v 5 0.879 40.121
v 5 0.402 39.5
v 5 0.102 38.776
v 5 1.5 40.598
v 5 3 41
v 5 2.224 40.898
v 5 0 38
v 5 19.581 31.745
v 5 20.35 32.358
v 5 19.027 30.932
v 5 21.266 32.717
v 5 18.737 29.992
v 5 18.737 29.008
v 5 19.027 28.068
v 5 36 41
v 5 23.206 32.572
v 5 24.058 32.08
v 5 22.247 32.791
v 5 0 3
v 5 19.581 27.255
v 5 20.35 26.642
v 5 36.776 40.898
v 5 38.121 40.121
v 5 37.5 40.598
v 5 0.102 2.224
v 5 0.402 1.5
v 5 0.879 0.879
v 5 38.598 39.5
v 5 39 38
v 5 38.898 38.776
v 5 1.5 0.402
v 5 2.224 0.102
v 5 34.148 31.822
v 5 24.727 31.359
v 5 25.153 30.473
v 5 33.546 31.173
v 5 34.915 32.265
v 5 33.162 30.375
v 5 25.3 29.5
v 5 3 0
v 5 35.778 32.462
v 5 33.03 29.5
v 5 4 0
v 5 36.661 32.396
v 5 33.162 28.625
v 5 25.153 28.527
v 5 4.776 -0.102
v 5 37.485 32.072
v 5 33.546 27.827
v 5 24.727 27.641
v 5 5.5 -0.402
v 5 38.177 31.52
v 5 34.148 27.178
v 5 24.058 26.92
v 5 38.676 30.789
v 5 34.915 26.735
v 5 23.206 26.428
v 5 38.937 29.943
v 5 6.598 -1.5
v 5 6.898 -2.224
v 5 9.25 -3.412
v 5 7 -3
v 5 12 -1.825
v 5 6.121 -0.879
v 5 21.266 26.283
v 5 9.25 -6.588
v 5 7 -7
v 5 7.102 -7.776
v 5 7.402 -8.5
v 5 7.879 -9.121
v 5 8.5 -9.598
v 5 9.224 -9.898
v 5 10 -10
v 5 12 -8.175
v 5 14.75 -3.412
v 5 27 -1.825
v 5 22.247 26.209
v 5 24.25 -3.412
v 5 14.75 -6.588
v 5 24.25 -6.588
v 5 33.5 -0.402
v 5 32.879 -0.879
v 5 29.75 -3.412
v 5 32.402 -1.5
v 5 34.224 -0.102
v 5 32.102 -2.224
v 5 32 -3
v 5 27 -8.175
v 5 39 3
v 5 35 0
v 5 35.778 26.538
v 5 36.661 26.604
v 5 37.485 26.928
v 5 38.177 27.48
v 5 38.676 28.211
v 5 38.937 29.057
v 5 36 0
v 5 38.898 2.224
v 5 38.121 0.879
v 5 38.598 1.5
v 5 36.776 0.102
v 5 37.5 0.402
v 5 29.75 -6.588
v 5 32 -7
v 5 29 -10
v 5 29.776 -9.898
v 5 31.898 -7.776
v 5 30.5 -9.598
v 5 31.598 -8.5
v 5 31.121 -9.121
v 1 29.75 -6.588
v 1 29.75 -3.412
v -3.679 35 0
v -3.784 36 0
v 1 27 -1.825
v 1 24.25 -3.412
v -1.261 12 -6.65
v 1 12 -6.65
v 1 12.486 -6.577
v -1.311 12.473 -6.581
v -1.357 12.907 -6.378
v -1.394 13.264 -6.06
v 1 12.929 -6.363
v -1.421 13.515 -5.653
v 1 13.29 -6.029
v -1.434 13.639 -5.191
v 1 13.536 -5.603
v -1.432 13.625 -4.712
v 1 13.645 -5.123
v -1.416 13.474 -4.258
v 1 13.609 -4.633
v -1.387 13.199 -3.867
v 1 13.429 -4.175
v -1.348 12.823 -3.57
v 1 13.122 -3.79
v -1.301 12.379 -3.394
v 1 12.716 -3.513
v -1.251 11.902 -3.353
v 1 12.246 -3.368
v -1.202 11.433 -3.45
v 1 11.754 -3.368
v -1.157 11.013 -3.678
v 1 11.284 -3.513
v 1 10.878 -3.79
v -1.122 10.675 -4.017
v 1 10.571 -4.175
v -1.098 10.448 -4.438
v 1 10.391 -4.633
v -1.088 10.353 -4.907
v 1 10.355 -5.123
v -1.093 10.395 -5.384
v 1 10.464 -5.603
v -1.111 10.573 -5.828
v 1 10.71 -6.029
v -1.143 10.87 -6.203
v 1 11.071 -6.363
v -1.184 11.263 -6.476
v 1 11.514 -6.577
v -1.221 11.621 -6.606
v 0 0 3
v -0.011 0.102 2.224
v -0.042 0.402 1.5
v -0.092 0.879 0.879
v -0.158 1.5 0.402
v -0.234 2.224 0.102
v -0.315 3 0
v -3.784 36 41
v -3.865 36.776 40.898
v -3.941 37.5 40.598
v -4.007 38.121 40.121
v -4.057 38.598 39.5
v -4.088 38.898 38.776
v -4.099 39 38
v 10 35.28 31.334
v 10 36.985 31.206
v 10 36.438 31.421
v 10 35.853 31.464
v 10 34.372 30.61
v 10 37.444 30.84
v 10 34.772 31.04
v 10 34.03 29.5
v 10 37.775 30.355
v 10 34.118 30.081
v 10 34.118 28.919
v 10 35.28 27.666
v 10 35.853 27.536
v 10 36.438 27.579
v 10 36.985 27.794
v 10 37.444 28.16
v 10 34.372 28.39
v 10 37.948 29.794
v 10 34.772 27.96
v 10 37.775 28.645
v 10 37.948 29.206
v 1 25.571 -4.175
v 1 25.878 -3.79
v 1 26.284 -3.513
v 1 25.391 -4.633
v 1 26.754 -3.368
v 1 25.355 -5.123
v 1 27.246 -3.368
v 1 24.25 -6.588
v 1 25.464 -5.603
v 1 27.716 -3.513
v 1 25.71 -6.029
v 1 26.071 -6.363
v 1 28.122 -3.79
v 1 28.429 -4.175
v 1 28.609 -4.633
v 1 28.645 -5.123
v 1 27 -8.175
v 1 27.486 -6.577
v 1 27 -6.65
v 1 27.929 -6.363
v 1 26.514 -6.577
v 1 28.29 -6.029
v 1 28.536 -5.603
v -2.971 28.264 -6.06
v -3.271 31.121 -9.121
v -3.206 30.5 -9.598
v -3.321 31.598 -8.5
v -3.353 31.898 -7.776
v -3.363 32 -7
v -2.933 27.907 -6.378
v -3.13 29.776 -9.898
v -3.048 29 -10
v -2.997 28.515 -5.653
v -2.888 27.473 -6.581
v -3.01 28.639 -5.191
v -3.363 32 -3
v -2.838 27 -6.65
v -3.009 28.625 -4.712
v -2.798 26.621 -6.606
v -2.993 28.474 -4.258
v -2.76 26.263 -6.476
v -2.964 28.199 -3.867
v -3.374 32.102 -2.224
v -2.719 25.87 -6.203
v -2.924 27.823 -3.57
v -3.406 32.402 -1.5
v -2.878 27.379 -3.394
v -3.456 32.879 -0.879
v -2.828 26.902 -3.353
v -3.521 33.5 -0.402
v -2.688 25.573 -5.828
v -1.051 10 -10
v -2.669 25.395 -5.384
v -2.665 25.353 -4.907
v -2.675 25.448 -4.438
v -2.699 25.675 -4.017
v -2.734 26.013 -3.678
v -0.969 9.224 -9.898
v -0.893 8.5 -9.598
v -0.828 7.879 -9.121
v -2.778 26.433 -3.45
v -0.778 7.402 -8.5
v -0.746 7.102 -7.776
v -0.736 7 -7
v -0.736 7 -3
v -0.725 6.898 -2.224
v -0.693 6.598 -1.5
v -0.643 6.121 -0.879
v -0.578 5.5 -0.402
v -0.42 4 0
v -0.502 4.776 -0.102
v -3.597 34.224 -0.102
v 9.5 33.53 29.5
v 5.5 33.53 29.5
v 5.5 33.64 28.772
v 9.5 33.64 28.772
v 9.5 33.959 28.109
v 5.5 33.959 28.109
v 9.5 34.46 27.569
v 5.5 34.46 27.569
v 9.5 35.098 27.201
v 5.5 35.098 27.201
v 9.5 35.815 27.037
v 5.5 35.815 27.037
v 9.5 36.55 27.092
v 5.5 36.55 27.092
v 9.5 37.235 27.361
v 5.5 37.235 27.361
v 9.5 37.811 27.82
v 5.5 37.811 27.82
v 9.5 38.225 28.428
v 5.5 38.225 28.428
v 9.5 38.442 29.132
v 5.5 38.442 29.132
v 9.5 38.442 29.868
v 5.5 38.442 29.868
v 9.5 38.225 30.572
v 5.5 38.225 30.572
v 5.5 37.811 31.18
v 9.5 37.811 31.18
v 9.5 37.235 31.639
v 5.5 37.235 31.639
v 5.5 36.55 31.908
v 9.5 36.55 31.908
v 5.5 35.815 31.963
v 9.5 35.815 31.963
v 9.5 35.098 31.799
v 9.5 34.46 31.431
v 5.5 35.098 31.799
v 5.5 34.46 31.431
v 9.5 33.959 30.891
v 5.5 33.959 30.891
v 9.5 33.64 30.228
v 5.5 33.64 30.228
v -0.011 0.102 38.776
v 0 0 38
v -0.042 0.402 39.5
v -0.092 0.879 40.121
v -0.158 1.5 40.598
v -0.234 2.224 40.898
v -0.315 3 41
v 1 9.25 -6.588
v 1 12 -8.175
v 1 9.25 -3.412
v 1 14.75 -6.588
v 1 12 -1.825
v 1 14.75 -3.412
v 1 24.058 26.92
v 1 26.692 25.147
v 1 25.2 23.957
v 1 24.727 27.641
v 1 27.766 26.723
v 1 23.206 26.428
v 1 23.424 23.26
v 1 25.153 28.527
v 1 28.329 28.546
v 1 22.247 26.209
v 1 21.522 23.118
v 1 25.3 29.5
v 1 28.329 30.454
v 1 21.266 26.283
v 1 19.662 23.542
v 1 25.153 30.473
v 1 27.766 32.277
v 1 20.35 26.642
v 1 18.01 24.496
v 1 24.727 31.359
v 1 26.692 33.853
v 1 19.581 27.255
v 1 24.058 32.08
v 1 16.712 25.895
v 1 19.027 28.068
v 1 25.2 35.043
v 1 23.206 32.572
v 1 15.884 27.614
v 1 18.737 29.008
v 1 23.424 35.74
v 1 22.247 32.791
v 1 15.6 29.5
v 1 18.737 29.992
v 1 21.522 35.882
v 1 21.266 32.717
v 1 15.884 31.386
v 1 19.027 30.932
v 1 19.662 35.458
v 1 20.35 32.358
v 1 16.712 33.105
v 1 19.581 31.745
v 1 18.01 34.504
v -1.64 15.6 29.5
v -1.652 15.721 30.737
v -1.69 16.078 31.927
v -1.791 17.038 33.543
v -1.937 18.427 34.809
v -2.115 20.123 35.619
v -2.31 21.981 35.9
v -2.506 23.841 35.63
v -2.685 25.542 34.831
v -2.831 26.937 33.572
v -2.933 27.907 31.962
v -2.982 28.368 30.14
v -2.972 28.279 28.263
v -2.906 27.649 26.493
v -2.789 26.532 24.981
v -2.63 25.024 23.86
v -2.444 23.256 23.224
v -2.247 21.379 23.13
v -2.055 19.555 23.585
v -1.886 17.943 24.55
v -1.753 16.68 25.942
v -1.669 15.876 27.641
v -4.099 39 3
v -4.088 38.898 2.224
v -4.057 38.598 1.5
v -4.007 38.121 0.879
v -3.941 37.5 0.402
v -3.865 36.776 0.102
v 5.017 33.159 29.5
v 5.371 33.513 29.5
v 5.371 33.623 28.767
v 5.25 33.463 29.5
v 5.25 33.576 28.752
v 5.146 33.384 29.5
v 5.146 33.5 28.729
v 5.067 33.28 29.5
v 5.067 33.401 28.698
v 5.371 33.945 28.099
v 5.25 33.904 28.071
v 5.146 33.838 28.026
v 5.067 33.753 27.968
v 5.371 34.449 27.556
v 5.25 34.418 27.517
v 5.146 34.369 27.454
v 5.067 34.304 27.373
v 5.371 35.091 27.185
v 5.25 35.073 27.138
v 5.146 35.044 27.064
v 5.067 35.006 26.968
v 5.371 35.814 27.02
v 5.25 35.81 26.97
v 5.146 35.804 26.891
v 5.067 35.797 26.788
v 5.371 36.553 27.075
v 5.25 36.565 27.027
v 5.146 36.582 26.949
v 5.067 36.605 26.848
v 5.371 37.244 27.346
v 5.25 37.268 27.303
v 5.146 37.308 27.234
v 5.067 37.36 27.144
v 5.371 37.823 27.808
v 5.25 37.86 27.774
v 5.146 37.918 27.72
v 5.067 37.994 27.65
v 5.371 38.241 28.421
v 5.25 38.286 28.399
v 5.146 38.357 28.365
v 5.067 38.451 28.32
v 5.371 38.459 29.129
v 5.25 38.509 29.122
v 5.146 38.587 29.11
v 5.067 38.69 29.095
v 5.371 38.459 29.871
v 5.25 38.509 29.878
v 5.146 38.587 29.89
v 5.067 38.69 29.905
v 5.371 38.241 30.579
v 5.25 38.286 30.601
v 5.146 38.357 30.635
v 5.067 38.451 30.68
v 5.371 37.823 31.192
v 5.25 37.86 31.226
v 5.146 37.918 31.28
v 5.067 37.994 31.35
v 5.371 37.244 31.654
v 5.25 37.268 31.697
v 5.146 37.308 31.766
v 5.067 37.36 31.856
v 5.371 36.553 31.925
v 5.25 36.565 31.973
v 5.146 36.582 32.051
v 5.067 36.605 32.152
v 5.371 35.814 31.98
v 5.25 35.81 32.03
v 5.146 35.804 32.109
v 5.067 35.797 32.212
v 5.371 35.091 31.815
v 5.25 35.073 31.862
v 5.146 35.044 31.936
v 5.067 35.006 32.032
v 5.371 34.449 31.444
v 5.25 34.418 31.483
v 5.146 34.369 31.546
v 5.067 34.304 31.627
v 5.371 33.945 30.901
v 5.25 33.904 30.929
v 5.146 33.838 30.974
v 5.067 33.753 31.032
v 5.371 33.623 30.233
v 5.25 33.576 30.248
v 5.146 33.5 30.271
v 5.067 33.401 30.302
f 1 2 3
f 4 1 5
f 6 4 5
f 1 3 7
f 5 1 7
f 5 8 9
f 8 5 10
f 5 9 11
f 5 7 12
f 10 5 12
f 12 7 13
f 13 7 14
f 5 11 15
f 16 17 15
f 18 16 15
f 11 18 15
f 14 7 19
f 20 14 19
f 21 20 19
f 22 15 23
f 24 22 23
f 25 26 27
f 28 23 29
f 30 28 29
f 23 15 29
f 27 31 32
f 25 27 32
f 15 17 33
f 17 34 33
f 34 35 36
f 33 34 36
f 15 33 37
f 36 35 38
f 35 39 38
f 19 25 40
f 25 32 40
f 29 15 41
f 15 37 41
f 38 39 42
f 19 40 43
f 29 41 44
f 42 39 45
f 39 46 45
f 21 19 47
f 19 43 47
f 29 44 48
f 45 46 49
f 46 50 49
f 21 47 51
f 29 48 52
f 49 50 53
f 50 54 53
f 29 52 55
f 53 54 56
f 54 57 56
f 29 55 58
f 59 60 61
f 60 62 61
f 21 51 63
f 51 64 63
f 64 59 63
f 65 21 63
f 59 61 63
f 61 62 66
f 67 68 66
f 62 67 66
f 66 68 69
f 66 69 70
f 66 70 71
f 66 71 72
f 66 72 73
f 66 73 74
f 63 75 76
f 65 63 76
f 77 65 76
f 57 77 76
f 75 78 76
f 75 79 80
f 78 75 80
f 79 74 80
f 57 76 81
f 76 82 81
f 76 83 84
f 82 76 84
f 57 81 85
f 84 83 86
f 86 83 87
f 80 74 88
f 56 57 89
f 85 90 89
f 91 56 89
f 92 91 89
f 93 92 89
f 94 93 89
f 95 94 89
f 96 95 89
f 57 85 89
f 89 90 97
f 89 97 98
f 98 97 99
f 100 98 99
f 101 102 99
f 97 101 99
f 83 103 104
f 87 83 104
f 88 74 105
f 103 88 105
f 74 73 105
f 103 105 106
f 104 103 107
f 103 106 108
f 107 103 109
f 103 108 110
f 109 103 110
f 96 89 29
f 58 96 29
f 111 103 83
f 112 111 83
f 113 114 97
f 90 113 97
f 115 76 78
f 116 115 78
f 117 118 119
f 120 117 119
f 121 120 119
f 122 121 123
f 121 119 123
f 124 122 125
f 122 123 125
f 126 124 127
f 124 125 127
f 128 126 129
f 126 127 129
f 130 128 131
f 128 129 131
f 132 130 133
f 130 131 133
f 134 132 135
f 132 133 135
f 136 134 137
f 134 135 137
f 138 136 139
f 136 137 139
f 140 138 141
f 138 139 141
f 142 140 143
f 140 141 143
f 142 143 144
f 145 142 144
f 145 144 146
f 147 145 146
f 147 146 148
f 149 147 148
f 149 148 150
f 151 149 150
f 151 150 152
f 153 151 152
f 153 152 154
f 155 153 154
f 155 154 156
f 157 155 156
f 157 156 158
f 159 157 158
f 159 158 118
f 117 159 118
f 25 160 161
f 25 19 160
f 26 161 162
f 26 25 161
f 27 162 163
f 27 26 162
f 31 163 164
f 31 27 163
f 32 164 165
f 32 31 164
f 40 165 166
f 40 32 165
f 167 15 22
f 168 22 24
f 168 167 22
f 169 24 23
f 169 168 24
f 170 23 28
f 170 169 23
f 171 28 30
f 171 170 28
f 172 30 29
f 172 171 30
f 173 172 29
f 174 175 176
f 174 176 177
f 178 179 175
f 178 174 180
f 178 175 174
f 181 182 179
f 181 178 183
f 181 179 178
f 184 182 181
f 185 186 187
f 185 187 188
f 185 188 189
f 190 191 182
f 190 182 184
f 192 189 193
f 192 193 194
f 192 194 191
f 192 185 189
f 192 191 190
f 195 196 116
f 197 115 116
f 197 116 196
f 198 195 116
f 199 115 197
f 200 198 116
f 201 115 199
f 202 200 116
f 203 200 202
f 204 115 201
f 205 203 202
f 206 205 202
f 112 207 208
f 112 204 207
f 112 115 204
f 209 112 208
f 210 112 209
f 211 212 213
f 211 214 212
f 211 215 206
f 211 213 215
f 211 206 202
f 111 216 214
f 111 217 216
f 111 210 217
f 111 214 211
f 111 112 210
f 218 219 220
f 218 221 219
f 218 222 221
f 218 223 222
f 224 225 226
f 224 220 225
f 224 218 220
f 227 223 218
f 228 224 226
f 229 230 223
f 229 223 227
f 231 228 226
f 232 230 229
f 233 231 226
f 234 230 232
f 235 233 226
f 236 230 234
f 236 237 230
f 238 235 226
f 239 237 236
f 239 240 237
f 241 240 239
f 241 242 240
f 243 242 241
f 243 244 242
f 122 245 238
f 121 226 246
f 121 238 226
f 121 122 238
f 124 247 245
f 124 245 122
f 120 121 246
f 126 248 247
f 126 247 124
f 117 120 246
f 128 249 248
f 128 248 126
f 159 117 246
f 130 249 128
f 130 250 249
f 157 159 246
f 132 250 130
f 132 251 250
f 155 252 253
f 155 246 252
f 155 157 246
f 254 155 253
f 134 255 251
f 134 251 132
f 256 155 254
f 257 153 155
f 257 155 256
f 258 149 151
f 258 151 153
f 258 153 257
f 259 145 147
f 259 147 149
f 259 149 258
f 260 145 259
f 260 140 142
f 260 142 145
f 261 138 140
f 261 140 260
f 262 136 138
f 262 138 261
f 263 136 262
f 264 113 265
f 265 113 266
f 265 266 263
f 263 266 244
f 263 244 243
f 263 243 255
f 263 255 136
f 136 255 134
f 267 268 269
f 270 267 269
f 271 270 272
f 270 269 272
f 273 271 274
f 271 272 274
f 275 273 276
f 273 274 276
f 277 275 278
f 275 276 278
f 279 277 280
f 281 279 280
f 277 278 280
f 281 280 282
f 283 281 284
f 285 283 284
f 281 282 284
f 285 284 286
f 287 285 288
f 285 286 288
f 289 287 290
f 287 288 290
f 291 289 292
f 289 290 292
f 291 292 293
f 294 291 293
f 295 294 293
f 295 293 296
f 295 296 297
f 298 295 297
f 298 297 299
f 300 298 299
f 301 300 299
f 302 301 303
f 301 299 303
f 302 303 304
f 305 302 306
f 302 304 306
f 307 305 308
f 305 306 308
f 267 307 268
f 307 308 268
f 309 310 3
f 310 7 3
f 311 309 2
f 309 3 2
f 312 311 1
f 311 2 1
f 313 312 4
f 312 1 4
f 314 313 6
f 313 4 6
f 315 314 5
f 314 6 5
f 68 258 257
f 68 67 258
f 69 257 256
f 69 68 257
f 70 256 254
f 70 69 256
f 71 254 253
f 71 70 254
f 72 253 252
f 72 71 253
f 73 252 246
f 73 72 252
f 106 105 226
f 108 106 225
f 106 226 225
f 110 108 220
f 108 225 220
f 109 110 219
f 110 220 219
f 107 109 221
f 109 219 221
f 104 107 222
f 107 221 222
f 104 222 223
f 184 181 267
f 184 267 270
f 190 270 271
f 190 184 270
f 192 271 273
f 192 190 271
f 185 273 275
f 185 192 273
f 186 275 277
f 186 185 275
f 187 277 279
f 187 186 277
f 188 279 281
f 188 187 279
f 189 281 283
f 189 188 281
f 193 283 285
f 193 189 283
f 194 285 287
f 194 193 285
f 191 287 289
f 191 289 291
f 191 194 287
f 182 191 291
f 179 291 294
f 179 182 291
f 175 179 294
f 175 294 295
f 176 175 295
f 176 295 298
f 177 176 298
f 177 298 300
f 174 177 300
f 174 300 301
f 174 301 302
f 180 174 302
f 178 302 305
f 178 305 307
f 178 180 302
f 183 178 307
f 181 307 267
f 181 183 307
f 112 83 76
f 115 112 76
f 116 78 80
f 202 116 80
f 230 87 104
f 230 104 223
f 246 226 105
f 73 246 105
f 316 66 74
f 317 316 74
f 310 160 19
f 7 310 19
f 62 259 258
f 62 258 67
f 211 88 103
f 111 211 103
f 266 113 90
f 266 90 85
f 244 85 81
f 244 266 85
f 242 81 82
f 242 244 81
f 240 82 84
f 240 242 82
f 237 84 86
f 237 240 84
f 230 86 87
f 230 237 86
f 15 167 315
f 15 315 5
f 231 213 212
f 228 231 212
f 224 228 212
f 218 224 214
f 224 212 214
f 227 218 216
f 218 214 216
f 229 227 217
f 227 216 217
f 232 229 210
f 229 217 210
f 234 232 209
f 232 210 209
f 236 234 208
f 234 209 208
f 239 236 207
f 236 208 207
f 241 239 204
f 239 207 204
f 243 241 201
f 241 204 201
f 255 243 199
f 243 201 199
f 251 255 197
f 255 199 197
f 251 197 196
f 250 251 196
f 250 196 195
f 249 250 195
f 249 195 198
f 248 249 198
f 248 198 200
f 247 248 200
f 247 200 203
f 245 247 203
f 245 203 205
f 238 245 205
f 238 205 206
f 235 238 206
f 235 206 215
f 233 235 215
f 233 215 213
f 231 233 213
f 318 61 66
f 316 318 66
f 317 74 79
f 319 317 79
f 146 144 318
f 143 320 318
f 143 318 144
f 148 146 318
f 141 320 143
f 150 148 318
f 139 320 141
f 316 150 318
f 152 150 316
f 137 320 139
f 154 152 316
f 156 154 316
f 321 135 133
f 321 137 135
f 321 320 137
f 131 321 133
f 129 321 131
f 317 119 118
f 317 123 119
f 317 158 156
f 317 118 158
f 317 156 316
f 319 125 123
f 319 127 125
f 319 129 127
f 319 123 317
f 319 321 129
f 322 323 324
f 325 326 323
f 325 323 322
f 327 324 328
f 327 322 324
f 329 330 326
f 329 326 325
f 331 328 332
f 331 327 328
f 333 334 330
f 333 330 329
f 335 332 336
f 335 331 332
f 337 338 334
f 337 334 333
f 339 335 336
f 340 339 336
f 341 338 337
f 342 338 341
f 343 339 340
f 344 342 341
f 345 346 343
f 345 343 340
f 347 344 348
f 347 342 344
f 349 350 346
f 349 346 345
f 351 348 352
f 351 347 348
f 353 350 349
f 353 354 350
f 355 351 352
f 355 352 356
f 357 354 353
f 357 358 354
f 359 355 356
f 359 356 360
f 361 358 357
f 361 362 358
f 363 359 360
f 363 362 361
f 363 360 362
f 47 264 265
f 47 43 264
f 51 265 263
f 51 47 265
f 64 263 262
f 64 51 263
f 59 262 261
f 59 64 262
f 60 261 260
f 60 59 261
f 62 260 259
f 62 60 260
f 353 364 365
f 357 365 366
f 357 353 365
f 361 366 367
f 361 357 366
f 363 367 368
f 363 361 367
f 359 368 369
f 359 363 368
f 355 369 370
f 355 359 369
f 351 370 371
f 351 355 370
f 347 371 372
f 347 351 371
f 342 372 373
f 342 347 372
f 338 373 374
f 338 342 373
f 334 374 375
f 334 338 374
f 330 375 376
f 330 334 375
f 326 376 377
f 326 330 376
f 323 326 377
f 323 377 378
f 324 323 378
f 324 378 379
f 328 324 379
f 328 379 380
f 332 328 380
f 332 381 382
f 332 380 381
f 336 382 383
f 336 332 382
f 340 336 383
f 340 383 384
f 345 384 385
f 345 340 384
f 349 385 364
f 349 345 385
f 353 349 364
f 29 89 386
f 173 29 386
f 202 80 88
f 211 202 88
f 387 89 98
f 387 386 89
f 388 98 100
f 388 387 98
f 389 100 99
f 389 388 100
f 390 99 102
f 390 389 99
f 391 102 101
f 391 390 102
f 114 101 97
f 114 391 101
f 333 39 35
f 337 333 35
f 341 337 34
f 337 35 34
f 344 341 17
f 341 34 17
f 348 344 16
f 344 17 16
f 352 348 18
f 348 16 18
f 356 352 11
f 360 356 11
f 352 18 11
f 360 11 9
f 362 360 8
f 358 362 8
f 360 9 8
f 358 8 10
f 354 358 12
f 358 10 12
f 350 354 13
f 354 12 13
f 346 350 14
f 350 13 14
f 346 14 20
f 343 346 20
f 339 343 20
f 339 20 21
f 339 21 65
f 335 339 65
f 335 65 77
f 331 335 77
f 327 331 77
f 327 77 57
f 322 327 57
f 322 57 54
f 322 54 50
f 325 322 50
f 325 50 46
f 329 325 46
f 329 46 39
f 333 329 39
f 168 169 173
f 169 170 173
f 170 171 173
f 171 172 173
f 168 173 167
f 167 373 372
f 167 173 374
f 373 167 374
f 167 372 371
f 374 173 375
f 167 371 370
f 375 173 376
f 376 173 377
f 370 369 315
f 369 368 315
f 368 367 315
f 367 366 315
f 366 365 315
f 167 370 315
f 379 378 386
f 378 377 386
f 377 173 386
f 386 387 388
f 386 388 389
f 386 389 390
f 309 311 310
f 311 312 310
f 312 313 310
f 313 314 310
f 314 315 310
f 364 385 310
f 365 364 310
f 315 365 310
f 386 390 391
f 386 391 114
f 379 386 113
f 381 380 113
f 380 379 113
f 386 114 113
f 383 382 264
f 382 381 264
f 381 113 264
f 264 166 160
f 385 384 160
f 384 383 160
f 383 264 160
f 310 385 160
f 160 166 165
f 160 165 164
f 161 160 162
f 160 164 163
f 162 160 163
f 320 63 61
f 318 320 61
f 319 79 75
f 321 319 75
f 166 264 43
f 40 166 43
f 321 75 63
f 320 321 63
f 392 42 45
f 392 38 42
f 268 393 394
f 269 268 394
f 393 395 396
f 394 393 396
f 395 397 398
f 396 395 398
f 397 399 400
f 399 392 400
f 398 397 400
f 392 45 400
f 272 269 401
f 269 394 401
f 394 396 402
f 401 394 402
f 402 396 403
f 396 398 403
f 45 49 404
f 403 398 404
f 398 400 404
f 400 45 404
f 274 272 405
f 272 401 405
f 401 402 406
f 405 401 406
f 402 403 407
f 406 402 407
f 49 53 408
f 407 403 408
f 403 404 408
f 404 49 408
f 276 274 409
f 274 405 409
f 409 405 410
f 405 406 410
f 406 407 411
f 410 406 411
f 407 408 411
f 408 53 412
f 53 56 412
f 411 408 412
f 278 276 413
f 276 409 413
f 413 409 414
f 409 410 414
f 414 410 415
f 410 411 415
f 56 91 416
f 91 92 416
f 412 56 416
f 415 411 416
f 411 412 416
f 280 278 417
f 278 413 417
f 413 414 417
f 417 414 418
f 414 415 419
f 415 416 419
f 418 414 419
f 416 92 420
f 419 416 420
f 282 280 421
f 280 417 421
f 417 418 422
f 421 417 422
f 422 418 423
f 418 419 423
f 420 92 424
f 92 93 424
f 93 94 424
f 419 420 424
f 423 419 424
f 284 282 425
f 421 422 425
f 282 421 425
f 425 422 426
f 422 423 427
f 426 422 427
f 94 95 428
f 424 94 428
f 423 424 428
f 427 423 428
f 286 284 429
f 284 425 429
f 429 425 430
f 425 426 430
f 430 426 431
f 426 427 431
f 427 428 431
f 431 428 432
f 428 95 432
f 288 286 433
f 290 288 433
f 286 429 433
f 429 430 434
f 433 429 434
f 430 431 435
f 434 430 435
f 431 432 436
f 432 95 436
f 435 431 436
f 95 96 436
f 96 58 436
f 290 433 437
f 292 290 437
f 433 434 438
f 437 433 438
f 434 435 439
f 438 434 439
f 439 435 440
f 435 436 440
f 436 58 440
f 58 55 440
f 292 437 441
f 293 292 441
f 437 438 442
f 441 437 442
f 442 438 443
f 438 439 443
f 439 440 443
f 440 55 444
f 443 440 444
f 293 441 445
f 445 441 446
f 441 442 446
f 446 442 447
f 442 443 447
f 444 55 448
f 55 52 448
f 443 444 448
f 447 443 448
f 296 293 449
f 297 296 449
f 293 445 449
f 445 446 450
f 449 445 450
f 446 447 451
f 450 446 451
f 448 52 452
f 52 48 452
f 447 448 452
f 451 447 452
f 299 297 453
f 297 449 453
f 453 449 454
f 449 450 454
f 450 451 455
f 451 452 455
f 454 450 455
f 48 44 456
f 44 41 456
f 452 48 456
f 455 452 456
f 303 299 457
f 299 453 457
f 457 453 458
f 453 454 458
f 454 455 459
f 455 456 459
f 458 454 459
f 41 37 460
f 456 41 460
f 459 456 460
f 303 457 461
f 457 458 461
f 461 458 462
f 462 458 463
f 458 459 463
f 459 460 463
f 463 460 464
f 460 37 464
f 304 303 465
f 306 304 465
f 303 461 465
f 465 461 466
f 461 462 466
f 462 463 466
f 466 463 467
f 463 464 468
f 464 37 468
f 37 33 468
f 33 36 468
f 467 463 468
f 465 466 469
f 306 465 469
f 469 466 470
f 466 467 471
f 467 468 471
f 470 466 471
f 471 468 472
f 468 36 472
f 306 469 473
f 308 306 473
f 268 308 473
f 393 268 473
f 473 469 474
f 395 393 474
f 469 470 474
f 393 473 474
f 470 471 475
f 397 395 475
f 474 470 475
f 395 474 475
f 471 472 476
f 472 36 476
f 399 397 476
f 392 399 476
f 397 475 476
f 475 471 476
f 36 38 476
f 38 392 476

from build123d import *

# Parameters (mm, degrees)
EXTRUDE_1_DEPTH     = 41
CUT_EXTRUDE_1_REACH = 59.313
SKETCH_2_R          = 3.3
CUT_EXTRUDE_2_REACH = 58.815
SKETCH_3_R          = 6.4
SKETCH_4_R          = 2.47
EXTRUDE_2_DEPTH     = 5
CHAMFER_1_SIZE      = 0.5
FILLET_1_R          = 0.5
EXTRUDE_3_DEPTH     = 10
CUT_EXTRUDE_3_DEPTH = 4
CUT_EXTRUDE_4_REACH = 59.297
SKETCH_7_R          = 1.65
FILLET_2_R          = 3


with BuildPart() as part:
    # 草图1 → 凸台-拉伸1 (new body)
    with BuildSketch(Plane.XY):
        Polygon((0, 0), (5, 0), (5, 39), (-4.099065175, 39), align=None)
    extrude(amount=EXTRUDE_1_DEPTH)

    # 切除-拉伸1: up to this plane
    cut_extrude_1_end = Plane(origin=(0, 0, 41), z_dir=(0.9945218953682742, 0.10452846326764682, 0))
    # 草图2 → 切除-拉伸1 (cut, up to the surface)
    with BuildSketch(Plane(origin=(5, 0, 0), x_dir=(0, 0, -1), z_dir=(1, 0, 0)), mode=Mode.PRIVATE) as cut_extrude_1_sk1:
        with Locations(Location((-29.5, 22, 0), (0, 0, 90))):
            Circle(SKETCH_2_R)
    cut_extrude_1_tool1 = split(extrude(cut_extrude_1_sk1.sketch, amount=-CUT_EXTRUDE_1_REACH, mode=Mode.PRIVATE), bisect_by=cut_extrude_1_end, keep=Keep.BOTH, mode=Mode.PRIVATE)
    add(cut_extrude_1_tool1.solids().sort_by_distance((5, 22, 29.5))[0], mode=Mode.SUBTRACT)

    # 切除-拉伸2: up to this plane
    cut_extrude_2_end = Plane(origin=(0, 0, 41), z_dir=(0.9945218953682742, 0.10452846326764682, 0))
    # 草图3 → 切除-拉伸2 (cut, up to the surface)
    with BuildSketch(Plane.ZY.offset(-1), mode=Mode.PRIVATE) as cut_extrude_2_sk1:
        with Locations(Location((29.5, 22, 0), (0, 0, 270))):
            Circle(SKETCH_3_R)
    cut_extrude_2_tool1 = split(extrude(cut_extrude_2_sk1.sketch, amount=CUT_EXTRUDE_2_REACH, mode=Mode.PRIVATE), bisect_by=cut_extrude_2_end, keep=Keep.BOTH, mode=Mode.PRIVATE)
    add(cut_extrude_2_tool1.solids().sort_by_distance((1, 22, 29.5))[0], mode=Mode.SUBTRACT)

    # 草图4 → 凸台-拉伸2 (add)
    with BuildSketch(Plane(origin=(5, 0, 0), x_dir=(0, 0, -1), z_dir=(1, 0, 0))):
        with Locations(Location((-29.5, 36, 0), (0, 0, 270))):
            Circle(SKETCH_4_R)
    extrude(amount=EXTRUDE_2_DEPTH)

    # 倒角1
    chamfer_1_edges = [part.edges().sort_by_distance(p)[0] for p in [
        (10, 38.47, 29.5),
    ]]
    chamfer(chamfer_1_edges, length=CHAMFER_1_SIZE)

    # 圆角1
    fillet_1_edges = [part.edges().sort_by_distance(p)[0] for p in [
        (5, 38.47, 29.5),
    ]]
    fillet(fillet_1_edges, radius=FILLET_1_R)

    # 草图5 → 凸台-拉伸3 (add)
    with BuildSketch(Plane(origin=(0, 0, 0), x_dir=(-1, 0, 0), z_dir=(0, 0, -1))):
        Polygon((-5, 32), (3.363335529, 32), (0.735729647, 7), (-5, 7), align=None)
    extrude(amount=EXTRUDE_3_DEPTH)

    # 草图6 → 切除-拉伸3 (cut)
    with BuildSketch(Plane(origin=(5, 0, 0), x_dir=(0, 0, -1), z_dir=(1, 0, 0))):
        Polygon((8.175426481, 27), (6.58771324, 29.75), (3.41228676, 29.75), (1.824573519, 27), (3.41228676, 24.25), (6.58771324, 24.25), align=None)
        Polygon((8.175426481, 12), (6.58771324, 14.75), (3.41228676, 14.75), (1.824573519, 12), (3.41228676, 9.25), (6.58771324, 9.25), align=None)
    extrude(amount=-CUT_EXTRUDE_3_DEPTH, mode=Mode.SUBTRACT)

    # 切除-拉伸4: up to this plane
    cut_extrude_4_end = Plane(origin=(0, 0, 41), z_dir=(0.9945218953682742, 0.10452846326764682, 0))
    # 草图7 → 切除-拉伸4 (cut, up to the surface)
    with BuildSketch(Plane(origin=(1, 0, 0), x_dir=(0, 0, -1), z_dir=(1, 0, 0)), mode=Mode.PRIVATE) as cut_extrude_4_sk1:
        with Locations((5, 27)):
            Circle(SKETCH_7_R)
    cut_extrude_4_tool1 = split(extrude(cut_extrude_4_sk1.sketch, amount=-CUT_EXTRUDE_4_REACH, mode=Mode.PRIVATE), bisect_by=cut_extrude_4_end, keep=Keep.BOTH, mode=Mode.PRIVATE)
    add(cut_extrude_4_tool1.solids().sort_by_distance((1, 27, -5))[0], mode=Mode.SUBTRACT)
    # 草图7 → 切除-拉伸4 (cut, up to the surface)
    with BuildSketch(Plane(origin=(1, 0, 0), x_dir=(0, 0, -1), z_dir=(1, 0, 0)), mode=Mode.PRIVATE) as cut_extrude_4_sk2:
        with Locations((5, 12)):
            Circle(SKETCH_7_R)
    cut_extrude_4_tool2 = split(extrude(cut_extrude_4_sk2.sketch, amount=-CUT_EXTRUDE_4_REACH, mode=Mode.PRIVATE), bisect_by=cut_extrude_4_end, keep=Keep.BOTH, mode=Mode.PRIVATE)
    add(cut_extrude_4_tool2.solids().sort_by_distance((1, 12, -5))[0], mode=Mode.SUBTRACT)

    # 圆角2
    fillet_2_edges = [part.edges().sort_by_distance(p)[0] for p in [
        (0.450467412, 39, 41),
        (2.132135177, 7, 0),
        (0.818332236, 32, 0),
        (2.132135177, 7, -10),
        (0.818332236, 32, -10),
        (0.450467412, 39, 0),
        (2.5, 0, 0),
        (2.5, 0, 41),
    ]]
    fillet(fillet_2_edges, radius=FILLET_2_R)


solid = part.part
